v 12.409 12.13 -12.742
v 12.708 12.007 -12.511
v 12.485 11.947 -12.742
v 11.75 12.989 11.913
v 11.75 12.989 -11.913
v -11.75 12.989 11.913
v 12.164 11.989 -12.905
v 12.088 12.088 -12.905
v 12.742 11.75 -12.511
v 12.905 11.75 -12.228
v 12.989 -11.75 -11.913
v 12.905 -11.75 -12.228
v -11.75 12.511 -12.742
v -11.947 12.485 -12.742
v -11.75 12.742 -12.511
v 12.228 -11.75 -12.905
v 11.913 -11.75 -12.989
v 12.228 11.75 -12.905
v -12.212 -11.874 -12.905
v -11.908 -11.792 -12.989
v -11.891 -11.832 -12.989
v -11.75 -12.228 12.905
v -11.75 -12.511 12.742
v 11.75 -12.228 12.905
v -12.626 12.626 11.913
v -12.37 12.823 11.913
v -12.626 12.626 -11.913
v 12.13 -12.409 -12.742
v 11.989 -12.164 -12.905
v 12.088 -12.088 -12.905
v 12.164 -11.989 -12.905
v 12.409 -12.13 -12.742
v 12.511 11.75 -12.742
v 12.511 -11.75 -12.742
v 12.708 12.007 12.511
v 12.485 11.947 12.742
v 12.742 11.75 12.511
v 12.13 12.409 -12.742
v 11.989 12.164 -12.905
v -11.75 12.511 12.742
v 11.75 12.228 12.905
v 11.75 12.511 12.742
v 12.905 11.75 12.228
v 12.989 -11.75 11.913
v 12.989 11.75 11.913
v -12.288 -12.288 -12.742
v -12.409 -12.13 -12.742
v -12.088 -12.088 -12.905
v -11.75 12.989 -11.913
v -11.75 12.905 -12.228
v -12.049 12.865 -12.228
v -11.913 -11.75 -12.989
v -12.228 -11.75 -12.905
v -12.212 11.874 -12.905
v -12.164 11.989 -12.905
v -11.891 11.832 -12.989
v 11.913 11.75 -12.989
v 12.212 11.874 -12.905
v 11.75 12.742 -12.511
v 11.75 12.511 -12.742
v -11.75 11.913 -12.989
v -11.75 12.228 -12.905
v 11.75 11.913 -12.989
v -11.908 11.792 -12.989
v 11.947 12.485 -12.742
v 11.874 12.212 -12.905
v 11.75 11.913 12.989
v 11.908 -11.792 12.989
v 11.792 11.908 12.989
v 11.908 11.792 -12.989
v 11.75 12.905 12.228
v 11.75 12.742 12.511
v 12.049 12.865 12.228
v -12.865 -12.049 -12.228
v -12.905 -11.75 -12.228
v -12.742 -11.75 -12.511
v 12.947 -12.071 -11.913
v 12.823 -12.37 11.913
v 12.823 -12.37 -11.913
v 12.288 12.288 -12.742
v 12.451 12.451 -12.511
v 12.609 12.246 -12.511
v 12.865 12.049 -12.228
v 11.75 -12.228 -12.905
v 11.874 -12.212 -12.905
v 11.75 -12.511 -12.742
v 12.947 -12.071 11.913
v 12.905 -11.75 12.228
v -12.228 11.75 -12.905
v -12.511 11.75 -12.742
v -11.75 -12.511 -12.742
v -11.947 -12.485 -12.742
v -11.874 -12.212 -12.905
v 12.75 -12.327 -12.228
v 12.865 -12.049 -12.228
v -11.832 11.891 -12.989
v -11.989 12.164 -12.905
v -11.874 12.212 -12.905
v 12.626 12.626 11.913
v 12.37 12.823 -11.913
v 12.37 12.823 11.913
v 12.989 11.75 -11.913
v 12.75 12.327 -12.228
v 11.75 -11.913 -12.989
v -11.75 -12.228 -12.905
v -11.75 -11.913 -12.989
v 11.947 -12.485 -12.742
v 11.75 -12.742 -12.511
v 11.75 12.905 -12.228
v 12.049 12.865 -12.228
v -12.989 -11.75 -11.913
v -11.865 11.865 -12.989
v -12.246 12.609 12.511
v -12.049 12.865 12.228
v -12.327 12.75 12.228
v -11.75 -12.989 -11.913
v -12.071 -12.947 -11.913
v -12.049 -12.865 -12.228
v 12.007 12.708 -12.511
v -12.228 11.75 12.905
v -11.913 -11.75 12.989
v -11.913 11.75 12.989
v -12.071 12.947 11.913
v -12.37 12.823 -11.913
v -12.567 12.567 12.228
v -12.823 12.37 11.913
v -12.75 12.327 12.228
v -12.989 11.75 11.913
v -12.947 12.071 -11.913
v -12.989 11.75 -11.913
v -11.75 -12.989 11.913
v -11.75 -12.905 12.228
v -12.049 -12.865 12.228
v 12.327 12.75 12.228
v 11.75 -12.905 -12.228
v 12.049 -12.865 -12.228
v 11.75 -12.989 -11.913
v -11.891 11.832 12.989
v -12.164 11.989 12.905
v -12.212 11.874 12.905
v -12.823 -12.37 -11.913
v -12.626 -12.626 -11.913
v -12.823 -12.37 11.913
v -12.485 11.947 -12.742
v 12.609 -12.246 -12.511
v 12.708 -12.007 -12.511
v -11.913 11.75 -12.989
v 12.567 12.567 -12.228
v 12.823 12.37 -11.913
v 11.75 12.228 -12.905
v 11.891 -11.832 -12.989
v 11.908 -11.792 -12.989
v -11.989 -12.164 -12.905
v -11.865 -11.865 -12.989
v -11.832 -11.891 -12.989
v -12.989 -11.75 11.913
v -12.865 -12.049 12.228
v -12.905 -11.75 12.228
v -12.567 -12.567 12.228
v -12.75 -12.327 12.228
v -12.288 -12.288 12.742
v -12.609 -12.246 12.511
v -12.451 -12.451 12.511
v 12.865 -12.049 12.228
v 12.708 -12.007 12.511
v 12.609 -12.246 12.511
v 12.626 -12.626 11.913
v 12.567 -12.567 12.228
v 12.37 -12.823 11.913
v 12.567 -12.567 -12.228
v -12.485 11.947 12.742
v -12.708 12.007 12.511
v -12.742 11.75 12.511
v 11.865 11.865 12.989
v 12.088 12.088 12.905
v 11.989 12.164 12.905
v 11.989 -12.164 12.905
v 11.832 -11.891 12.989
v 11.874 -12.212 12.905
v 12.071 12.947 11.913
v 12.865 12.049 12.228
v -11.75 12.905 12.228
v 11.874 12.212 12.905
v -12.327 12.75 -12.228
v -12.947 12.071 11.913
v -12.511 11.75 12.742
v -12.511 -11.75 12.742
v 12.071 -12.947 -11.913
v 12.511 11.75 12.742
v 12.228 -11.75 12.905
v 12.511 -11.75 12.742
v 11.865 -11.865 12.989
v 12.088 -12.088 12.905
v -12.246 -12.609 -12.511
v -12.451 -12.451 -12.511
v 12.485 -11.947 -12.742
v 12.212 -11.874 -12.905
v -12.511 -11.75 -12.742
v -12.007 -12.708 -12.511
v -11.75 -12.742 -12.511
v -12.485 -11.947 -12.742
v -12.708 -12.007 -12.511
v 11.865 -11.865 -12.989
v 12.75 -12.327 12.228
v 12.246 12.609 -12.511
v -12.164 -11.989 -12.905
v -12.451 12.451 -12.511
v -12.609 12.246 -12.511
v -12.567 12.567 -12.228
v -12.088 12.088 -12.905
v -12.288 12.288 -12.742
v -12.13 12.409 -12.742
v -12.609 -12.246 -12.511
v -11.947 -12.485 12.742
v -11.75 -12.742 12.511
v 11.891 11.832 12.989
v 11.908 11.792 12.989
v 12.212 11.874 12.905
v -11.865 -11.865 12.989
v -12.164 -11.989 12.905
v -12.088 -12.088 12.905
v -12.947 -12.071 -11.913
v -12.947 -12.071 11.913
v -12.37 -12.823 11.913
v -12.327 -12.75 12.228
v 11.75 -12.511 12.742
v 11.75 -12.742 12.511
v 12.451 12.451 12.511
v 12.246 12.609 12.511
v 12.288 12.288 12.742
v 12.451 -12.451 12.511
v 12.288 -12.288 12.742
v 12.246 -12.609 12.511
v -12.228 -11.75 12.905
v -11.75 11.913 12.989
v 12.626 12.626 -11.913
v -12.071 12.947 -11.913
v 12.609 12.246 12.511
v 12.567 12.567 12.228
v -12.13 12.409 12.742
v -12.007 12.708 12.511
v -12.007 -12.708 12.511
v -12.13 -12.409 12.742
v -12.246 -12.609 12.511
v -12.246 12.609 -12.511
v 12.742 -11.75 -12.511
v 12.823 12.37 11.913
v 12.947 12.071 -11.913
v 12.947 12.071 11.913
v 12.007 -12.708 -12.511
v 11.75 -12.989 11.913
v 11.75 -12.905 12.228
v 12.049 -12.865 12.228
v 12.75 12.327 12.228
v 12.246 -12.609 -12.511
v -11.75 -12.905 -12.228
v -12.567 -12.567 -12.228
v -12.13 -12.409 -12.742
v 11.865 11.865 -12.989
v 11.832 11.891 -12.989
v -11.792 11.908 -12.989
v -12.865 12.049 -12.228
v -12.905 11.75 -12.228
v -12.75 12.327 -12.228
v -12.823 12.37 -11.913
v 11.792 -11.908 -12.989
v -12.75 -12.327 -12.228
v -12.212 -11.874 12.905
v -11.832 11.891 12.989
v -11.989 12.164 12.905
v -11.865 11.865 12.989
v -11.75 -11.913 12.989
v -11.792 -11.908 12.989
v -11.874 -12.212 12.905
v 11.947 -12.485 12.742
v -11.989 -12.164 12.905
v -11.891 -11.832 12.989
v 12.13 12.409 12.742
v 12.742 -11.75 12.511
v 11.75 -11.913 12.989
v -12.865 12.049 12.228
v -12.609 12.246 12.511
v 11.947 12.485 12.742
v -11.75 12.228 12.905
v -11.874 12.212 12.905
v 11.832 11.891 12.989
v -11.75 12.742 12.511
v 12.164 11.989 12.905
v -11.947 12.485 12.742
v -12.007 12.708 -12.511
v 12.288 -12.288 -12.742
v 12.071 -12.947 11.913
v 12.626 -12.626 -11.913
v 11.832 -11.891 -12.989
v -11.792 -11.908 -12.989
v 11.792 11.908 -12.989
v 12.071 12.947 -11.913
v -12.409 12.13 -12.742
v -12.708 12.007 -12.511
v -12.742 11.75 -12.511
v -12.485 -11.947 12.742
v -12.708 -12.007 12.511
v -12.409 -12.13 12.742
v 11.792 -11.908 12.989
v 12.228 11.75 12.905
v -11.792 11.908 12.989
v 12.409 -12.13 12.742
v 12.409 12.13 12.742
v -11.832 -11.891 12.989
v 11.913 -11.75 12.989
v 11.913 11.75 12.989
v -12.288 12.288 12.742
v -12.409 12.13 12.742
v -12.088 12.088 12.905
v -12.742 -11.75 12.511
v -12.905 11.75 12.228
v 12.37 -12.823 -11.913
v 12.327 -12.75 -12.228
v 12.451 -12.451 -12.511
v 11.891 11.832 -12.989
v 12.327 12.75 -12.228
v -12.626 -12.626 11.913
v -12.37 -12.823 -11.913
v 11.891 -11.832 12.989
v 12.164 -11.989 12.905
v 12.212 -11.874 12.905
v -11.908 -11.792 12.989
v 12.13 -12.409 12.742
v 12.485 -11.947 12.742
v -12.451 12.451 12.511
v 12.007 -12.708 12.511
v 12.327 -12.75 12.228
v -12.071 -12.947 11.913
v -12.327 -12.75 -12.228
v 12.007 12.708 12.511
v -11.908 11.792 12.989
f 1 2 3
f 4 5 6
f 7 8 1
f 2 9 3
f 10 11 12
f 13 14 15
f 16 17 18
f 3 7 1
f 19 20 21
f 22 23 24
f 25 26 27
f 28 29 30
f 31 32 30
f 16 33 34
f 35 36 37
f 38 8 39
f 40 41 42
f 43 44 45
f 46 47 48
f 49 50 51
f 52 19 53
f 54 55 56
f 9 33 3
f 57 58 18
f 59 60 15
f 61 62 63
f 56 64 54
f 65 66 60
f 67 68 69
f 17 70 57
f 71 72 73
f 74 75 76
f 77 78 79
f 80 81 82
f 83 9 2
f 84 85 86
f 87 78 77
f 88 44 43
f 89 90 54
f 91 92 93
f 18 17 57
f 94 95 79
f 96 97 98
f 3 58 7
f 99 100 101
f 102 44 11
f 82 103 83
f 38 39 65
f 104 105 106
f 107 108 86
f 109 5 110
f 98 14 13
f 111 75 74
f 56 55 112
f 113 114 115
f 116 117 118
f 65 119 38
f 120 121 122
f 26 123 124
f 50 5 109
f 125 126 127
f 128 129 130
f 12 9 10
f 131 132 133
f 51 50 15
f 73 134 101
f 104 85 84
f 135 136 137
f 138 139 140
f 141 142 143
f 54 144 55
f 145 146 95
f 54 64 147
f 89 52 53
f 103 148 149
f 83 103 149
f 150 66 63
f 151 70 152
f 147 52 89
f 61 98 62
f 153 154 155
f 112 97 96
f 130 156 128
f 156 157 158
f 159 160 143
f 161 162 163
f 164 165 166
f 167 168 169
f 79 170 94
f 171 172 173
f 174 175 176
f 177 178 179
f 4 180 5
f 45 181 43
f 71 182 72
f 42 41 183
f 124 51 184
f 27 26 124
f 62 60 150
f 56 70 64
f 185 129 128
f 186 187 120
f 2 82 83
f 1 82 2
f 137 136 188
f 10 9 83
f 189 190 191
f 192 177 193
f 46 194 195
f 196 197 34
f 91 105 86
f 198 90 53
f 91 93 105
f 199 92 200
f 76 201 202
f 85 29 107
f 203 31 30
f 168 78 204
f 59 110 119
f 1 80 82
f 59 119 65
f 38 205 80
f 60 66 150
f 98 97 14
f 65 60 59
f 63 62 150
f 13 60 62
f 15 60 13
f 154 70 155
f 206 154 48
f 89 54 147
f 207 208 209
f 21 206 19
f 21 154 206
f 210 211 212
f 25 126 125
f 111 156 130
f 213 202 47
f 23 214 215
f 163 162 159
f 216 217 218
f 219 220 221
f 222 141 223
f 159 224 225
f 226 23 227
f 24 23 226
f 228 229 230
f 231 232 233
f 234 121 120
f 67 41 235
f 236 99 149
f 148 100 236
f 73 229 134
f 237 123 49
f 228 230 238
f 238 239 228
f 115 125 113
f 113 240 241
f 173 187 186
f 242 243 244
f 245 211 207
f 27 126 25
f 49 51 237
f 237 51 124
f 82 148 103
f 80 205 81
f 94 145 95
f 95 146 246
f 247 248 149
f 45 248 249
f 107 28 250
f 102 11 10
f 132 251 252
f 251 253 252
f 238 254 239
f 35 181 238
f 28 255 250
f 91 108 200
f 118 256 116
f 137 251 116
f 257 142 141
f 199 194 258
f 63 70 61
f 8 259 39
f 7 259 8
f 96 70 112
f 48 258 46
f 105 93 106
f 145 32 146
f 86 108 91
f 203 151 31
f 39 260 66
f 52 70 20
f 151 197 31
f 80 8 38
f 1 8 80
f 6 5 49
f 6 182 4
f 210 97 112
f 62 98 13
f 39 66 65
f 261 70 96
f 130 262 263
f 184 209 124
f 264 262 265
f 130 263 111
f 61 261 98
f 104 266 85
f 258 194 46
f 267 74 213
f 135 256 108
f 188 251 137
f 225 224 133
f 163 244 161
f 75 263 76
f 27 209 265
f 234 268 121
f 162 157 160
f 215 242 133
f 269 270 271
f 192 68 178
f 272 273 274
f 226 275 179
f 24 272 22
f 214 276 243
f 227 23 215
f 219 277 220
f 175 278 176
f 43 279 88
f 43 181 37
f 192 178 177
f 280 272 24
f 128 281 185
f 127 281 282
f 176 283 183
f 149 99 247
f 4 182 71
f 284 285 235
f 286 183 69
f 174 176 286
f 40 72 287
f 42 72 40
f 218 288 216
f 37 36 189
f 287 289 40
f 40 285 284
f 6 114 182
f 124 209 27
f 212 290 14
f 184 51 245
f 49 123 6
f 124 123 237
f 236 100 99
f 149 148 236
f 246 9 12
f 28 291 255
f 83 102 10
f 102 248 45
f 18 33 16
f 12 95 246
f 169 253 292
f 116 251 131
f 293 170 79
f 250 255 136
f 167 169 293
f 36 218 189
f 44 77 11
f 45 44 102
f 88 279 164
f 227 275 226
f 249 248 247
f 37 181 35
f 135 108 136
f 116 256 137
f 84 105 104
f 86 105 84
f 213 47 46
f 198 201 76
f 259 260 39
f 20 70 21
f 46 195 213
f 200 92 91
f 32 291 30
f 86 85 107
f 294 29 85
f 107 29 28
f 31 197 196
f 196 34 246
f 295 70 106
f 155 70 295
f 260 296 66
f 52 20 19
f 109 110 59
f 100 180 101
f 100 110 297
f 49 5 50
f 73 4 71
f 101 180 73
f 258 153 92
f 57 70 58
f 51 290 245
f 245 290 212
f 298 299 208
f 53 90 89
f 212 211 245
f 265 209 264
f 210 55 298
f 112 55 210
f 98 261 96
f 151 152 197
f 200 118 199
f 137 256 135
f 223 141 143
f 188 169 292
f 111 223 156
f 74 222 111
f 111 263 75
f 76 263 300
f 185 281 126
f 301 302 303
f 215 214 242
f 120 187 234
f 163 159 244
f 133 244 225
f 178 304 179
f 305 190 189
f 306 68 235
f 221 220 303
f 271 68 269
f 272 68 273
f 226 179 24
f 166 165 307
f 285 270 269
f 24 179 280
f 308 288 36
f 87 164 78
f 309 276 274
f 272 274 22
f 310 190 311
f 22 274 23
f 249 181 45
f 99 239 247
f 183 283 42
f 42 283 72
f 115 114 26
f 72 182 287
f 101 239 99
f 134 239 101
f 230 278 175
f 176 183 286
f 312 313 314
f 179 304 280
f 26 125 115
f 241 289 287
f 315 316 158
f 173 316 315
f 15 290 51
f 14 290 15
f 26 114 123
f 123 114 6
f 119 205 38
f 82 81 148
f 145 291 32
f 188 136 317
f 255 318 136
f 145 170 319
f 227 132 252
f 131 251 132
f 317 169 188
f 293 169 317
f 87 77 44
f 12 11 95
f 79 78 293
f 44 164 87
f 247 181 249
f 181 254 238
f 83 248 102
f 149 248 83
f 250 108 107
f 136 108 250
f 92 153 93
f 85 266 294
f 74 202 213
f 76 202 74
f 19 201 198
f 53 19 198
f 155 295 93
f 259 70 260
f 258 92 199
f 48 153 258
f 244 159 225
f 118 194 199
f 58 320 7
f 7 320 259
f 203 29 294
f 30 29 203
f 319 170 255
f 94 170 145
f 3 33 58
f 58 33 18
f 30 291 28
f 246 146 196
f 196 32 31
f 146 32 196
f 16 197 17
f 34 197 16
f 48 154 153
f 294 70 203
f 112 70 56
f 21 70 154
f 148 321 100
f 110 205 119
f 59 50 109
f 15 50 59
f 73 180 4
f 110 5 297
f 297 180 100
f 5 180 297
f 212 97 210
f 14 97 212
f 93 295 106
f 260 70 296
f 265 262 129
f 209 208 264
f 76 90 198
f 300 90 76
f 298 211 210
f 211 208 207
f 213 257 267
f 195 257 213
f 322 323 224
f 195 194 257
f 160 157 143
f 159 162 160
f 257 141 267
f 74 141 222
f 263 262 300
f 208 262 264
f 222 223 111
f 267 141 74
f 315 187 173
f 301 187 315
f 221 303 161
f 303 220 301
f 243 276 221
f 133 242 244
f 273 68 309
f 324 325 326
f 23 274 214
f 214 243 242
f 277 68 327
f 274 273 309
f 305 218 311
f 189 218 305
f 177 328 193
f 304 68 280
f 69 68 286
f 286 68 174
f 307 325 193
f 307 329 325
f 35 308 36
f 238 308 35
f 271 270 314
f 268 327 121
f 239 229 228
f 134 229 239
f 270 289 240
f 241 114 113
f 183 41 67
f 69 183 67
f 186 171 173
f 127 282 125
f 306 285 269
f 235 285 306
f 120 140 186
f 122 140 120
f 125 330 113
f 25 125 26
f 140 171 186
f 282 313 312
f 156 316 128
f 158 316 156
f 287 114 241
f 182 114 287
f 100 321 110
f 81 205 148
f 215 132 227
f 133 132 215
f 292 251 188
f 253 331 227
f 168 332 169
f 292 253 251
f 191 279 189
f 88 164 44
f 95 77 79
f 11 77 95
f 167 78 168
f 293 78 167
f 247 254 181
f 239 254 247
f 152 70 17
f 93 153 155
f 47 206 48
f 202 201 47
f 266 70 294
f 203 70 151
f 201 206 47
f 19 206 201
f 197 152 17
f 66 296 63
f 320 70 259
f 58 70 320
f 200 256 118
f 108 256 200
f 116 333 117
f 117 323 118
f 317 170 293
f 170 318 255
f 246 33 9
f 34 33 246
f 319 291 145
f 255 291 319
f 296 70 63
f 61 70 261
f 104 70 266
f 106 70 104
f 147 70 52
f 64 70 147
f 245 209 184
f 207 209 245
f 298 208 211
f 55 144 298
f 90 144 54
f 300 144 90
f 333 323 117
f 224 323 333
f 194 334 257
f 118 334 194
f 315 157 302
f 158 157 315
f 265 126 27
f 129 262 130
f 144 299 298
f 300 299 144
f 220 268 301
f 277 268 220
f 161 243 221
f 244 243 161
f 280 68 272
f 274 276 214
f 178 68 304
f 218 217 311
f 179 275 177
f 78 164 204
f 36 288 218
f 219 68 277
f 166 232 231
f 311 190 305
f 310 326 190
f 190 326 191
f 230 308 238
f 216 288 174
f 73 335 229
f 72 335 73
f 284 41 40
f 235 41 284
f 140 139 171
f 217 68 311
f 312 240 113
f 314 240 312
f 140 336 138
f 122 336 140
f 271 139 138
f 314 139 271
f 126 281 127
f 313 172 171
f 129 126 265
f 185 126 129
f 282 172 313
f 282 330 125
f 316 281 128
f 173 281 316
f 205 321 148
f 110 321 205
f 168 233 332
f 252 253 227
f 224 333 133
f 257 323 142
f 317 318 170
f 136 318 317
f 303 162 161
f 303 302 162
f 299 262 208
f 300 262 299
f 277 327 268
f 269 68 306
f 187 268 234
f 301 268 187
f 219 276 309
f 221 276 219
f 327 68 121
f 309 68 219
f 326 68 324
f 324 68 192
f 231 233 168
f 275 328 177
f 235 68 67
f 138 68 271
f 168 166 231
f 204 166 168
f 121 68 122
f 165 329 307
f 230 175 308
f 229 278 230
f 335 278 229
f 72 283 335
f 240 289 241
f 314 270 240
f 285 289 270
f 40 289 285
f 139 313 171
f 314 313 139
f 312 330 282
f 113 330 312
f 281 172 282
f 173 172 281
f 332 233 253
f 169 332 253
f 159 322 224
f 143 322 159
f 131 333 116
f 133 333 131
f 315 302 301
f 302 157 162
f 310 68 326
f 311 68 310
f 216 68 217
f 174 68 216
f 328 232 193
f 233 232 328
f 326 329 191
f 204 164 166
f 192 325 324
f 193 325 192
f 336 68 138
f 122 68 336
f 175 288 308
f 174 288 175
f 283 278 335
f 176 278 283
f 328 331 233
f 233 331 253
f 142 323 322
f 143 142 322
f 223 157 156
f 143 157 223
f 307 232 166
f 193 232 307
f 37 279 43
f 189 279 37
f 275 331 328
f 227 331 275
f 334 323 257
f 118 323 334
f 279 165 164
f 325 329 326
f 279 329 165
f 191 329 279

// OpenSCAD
// A fillet made by minkowski() with a COARSE sphere renders measurably below
// its nominal size, and that is not a modelling error.
//
// Reproduction of server_rack_modular_v4/v8 parts/node.scad (measured
// 2026-09-12): minkowski() of a 23.5mm cube and sphere(r = 1.25, $fn = 24)
// declares EXPECTED_BBOX [26, 26, 26] and renders 25.9786 -- short by exactly
// 2*r*(1 - cos(pi/24)) = 0.0214 mm, because a 24-facet sphere does not reach
// its own radius in most directions.
//
// Before the minkowski-sphere term existed, bbox_error_bound() evaluated the
// shortfall at the PART's radius with the FILE's global $fn (180 fragments at
// $fa=2/$fs=0.3 -> 0.0040mm), the 0.005mm floor swallowed it, and this part
// FAILED by 0.0164mm. Declaring 25.9786 instead would be encoding a facets
// artefact into the design's own numbers.
//
// This fixture asserts the part PASSES. Its pair is dimensions_bbox_fail,
// which asserts a genuinely wrong size still FAILS -- widening the tolerance
// must not make that one pass.

$fa = 2; $fs = 0.3;
node_s = 26;
fillet = 2.5;

// EXPECTED_BBOX: [26, 26, 26]

translate([0, 0, 0])
    minkowski() {
        cube([node_s - fillet, node_s - fillet, node_s - fillet], center = true);
        sphere(r = fillet / 2, $fn = 24);
    }
